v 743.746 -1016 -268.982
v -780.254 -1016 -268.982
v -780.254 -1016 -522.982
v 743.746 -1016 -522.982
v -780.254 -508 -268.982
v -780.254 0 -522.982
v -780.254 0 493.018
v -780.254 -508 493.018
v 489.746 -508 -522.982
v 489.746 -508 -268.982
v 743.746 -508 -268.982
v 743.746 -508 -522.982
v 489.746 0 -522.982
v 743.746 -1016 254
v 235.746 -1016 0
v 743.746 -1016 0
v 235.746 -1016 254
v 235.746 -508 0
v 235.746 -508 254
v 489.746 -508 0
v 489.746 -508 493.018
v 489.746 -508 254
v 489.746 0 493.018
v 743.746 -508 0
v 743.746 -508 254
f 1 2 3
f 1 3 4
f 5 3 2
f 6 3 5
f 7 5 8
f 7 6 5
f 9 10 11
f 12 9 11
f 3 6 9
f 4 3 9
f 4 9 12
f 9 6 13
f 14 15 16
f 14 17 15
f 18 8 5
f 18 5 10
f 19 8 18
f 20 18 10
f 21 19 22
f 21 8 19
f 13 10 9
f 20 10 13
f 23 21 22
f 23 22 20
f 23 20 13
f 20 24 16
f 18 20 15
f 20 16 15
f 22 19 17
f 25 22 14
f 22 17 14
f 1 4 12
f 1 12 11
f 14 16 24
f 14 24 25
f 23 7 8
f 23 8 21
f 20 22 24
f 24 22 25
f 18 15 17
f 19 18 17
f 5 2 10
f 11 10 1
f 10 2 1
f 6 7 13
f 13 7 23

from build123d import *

# Parameters (mm, degrees)
F0_W     = 1524
F0_H     = 1016
F1_DEPTH = 1016
F2_W     = 254
F2_H     = 508
F3_DEPTH = 1524
F5_DEPTH = 508


with BuildPart() as f1:
    # F0 (on Front) → F1 (new body)
    with BuildSketch(Plane.XZ):
        with Locations((-18.253883, -14.982007)):
            Rectangle(F0_W, F0_H)
    extrude(amount=F1_DEPTH)

    # F2 (on face) → F3 (cut)
    with BuildSketch(Plane.XY.offset(493.017993)):
        with Locations((616.746117, -254)):
            Rectangle(F2_W, F2_H)
    extrude(amount=-F3_DEPTH, mode=Mode.SUBTRACT)

    # F4 (on face) → F5 (cut)
    with BuildSketch(Plane.XZ.offset(1016)):
        Polygon((743.746117, 493.017993), (-780.253883, 493.017993), (-780.253883, -268.982007), (743.746117, -268.982007), (743.746117, 0), (235.746117, 0), (235.746117, 254), (743.746117, 254), align=None)
    extrude(amount=-F5_DEPTH, mode=Mode.SUBTRACT)


solid = f1.part
